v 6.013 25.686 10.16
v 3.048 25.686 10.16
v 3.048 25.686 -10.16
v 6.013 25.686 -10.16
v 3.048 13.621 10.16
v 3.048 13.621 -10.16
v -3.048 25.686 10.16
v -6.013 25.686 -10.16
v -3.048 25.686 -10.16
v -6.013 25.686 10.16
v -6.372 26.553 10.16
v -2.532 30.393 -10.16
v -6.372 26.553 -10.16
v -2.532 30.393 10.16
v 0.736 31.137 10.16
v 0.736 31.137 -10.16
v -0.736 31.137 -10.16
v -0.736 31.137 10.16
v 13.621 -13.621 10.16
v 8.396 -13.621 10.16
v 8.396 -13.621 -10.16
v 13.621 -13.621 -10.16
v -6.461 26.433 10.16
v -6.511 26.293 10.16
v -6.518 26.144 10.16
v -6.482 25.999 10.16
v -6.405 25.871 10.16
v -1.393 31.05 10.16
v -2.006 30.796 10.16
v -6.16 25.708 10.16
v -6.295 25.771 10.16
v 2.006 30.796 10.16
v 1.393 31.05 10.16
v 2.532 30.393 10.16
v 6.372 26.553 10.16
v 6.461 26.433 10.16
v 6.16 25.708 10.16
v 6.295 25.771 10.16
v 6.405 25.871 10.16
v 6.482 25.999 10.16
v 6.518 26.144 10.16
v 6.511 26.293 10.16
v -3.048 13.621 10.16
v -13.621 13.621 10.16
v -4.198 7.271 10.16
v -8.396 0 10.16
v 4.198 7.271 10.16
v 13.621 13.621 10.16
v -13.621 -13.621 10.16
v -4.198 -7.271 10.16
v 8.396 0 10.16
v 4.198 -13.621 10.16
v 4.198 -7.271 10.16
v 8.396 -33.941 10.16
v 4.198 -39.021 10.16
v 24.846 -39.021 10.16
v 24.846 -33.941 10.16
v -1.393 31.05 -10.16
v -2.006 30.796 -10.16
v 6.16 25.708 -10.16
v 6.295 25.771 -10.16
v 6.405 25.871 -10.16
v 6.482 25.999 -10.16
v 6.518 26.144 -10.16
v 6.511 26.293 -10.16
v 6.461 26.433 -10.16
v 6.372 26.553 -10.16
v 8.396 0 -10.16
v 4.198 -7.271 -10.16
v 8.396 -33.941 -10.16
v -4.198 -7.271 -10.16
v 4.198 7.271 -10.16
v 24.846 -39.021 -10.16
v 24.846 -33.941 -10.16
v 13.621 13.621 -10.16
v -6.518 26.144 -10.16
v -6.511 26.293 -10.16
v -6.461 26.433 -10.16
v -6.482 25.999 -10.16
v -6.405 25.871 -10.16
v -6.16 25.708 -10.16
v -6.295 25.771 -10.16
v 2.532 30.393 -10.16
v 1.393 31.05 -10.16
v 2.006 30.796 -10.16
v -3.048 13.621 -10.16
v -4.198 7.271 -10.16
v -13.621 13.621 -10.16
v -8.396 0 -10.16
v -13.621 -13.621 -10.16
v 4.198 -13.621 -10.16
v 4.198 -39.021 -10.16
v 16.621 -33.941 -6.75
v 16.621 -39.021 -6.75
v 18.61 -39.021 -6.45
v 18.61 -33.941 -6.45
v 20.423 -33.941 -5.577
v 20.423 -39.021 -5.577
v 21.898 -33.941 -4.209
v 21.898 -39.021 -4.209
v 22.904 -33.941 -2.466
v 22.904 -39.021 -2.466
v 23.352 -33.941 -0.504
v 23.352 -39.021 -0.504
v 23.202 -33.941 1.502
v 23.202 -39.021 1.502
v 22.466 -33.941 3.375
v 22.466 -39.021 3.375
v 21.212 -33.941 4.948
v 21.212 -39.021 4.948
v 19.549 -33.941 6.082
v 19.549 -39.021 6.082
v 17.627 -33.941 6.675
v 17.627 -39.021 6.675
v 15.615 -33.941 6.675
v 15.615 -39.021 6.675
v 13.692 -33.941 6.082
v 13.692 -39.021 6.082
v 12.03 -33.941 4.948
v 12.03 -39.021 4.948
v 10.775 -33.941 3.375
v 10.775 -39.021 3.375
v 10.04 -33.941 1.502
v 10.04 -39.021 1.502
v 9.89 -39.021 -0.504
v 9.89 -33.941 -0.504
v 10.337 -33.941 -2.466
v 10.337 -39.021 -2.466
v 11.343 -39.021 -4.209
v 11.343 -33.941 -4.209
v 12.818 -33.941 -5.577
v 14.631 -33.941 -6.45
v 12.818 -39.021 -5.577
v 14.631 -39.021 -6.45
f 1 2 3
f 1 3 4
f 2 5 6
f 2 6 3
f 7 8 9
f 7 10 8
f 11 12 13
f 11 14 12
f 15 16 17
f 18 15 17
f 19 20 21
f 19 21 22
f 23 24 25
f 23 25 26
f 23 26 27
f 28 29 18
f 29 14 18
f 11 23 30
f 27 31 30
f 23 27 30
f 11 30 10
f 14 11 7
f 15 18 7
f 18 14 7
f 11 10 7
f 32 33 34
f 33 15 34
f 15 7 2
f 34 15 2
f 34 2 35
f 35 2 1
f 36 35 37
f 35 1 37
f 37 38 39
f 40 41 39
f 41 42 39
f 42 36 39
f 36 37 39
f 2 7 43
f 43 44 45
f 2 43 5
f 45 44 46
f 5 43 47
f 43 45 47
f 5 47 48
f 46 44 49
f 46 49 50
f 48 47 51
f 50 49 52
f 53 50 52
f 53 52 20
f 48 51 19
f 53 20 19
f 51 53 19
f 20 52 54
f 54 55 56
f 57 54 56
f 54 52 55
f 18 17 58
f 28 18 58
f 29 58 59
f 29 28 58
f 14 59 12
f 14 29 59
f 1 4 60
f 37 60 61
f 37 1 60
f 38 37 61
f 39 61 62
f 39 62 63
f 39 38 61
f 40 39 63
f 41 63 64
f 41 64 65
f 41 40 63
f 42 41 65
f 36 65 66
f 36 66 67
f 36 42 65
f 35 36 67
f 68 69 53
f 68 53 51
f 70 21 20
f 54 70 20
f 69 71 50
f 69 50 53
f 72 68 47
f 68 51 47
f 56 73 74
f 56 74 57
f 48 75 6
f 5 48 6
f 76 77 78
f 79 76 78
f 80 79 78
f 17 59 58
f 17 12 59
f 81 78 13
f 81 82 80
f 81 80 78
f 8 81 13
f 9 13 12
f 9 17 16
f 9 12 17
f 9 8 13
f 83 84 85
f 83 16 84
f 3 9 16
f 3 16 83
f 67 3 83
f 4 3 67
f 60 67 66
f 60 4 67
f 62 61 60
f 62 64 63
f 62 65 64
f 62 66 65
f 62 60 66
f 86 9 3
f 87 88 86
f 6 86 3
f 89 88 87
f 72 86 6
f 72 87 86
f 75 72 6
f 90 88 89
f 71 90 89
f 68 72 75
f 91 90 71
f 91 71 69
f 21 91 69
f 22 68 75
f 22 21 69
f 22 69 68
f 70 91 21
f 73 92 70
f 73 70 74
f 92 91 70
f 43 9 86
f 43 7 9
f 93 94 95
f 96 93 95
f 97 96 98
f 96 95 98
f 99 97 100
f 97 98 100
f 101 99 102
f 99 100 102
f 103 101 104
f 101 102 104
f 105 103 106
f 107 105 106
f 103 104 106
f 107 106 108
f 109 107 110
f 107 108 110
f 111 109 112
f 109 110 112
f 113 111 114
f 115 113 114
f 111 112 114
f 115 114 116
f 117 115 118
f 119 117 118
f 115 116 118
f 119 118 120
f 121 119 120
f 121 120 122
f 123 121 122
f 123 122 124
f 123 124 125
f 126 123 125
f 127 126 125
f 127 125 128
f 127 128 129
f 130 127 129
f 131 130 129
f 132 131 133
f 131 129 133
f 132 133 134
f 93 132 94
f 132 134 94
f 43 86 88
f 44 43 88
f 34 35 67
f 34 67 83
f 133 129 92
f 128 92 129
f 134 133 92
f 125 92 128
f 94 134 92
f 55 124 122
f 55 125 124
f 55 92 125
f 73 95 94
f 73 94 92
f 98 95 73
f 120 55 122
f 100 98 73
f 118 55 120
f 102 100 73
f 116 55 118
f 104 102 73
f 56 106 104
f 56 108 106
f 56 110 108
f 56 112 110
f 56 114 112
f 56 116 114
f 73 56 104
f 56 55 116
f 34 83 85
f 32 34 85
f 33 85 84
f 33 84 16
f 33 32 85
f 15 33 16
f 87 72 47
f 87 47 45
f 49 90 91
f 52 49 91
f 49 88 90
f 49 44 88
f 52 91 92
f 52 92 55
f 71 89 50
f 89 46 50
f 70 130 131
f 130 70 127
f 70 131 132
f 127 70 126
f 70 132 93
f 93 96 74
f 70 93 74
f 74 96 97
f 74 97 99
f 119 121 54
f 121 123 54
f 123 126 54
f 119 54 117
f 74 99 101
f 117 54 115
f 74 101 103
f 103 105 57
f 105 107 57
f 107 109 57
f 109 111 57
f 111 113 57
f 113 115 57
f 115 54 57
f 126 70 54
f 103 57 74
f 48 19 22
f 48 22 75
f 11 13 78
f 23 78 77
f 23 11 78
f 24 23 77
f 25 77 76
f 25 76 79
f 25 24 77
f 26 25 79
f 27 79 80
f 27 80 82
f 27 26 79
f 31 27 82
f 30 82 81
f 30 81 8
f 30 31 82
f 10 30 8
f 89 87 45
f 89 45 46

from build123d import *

# Parameters (mm, degrees)
BOSS_EXTRUDE1_DEPTH = 10.16
SKETCH3_W           = 4.197769469
SKETCH3_H           = 20.32
BOSS_EXTRUDE2_DEPTH = 25.4
SKETCH4_W           = 16.450422122
SKETCH4_H           = 20.32
SKETCH4_R           = 6.75
BOSS_EXTRUDE3_DEPTH = 5.08


with BuildPart() as part:
    # Sketch1 → Boss-Extrude1 (new, symmetric)
    with BuildSketch(Plane.XY):
        with BuildLine():
            Line((-13.62075, 13.62075), (-13.62075, -13.62075))
            Line((-13.62075, -13.62075), (13.62075, -13.62075))
            Line((13.62075, -13.62075), (13.62075, 13.62075))
            Line((13.62075, 13.62075), (3.048, 13.62075))
            Line((3.048, 13.62075), (3.048, 25.68575))
            Line((3.048, 25.68575), (6.01257951, 25.68575))
            ThreePointArc((6.01257951, 25.68575), (6.481910313, 25.999346816), (6.371789755, 26.552960245))
            Line((6.371789755, 26.552960245), (2.532108776, 30.392641224))
            ThreePointArc((2.532108776, 30.392641224), (1.70807347, 30.943244013), (0.736057552, 31.13659))
            Line((0.736057552, 31.13659), (-0.736057552, 31.13659))
            ThreePointArc((-0.736057552, 31.13659), (-1.70807347, 30.943244013), (-2.532108776, 30.392641224))
            Line((-2.532108776, 30.392641224), (-6.371789755, 26.552960245))
            ThreePointArc((-6.371789755, 26.552960245), (-6.481910313, 25.999346816), (-6.01257951, 25.68575))
            Line((-6.01257951, 25.68575), (-3.048, 25.68575))
            Line((-3.048, 25.68575), (-3.048, 13.62075))
            Line((-3.048, 13.62075), (-13.62075, 13.62075))
        make_face()
        Polygon((-4.19776947, 7.27075), (-8.395538939, 0), (-4.19776947, -7.27075), (4.19776947, -7.27075), (8.395538939, 0), (4.19776947, 7.27075), align=None, mode=Mode.SUBTRACT)
    extrude(amount=BOSS_EXTRUDE1_DEPTH, both=True)

    # Sketch3 → Boss-Extrude2 (add)
    with BuildSketch(Plane.XZ.offset(13.62075)):
        with Locations((6.296654204, 0)):
            Rectangle(SKETCH3_W, SKETCH3_H)
    extrude(amount=BOSS_EXTRUDE2_DEPTH)

    # Sketch4 → Boss-Extrude3 (add)
    with BuildSketch(Plane.XZ.offset(39.02075)):
        with Locations((16.62075, 0)):
            Rectangle(SKETCH4_W, SKETCH4_H)
        with Locations(Location((16.62075, 0, 0), (0, 0, 270))):
            Circle(SKETCH4_R, mode=Mode.SUBTRACT)
    extrude(amount=-BOSS_EXTRUDE3_DEPTH)


solid = part.part
